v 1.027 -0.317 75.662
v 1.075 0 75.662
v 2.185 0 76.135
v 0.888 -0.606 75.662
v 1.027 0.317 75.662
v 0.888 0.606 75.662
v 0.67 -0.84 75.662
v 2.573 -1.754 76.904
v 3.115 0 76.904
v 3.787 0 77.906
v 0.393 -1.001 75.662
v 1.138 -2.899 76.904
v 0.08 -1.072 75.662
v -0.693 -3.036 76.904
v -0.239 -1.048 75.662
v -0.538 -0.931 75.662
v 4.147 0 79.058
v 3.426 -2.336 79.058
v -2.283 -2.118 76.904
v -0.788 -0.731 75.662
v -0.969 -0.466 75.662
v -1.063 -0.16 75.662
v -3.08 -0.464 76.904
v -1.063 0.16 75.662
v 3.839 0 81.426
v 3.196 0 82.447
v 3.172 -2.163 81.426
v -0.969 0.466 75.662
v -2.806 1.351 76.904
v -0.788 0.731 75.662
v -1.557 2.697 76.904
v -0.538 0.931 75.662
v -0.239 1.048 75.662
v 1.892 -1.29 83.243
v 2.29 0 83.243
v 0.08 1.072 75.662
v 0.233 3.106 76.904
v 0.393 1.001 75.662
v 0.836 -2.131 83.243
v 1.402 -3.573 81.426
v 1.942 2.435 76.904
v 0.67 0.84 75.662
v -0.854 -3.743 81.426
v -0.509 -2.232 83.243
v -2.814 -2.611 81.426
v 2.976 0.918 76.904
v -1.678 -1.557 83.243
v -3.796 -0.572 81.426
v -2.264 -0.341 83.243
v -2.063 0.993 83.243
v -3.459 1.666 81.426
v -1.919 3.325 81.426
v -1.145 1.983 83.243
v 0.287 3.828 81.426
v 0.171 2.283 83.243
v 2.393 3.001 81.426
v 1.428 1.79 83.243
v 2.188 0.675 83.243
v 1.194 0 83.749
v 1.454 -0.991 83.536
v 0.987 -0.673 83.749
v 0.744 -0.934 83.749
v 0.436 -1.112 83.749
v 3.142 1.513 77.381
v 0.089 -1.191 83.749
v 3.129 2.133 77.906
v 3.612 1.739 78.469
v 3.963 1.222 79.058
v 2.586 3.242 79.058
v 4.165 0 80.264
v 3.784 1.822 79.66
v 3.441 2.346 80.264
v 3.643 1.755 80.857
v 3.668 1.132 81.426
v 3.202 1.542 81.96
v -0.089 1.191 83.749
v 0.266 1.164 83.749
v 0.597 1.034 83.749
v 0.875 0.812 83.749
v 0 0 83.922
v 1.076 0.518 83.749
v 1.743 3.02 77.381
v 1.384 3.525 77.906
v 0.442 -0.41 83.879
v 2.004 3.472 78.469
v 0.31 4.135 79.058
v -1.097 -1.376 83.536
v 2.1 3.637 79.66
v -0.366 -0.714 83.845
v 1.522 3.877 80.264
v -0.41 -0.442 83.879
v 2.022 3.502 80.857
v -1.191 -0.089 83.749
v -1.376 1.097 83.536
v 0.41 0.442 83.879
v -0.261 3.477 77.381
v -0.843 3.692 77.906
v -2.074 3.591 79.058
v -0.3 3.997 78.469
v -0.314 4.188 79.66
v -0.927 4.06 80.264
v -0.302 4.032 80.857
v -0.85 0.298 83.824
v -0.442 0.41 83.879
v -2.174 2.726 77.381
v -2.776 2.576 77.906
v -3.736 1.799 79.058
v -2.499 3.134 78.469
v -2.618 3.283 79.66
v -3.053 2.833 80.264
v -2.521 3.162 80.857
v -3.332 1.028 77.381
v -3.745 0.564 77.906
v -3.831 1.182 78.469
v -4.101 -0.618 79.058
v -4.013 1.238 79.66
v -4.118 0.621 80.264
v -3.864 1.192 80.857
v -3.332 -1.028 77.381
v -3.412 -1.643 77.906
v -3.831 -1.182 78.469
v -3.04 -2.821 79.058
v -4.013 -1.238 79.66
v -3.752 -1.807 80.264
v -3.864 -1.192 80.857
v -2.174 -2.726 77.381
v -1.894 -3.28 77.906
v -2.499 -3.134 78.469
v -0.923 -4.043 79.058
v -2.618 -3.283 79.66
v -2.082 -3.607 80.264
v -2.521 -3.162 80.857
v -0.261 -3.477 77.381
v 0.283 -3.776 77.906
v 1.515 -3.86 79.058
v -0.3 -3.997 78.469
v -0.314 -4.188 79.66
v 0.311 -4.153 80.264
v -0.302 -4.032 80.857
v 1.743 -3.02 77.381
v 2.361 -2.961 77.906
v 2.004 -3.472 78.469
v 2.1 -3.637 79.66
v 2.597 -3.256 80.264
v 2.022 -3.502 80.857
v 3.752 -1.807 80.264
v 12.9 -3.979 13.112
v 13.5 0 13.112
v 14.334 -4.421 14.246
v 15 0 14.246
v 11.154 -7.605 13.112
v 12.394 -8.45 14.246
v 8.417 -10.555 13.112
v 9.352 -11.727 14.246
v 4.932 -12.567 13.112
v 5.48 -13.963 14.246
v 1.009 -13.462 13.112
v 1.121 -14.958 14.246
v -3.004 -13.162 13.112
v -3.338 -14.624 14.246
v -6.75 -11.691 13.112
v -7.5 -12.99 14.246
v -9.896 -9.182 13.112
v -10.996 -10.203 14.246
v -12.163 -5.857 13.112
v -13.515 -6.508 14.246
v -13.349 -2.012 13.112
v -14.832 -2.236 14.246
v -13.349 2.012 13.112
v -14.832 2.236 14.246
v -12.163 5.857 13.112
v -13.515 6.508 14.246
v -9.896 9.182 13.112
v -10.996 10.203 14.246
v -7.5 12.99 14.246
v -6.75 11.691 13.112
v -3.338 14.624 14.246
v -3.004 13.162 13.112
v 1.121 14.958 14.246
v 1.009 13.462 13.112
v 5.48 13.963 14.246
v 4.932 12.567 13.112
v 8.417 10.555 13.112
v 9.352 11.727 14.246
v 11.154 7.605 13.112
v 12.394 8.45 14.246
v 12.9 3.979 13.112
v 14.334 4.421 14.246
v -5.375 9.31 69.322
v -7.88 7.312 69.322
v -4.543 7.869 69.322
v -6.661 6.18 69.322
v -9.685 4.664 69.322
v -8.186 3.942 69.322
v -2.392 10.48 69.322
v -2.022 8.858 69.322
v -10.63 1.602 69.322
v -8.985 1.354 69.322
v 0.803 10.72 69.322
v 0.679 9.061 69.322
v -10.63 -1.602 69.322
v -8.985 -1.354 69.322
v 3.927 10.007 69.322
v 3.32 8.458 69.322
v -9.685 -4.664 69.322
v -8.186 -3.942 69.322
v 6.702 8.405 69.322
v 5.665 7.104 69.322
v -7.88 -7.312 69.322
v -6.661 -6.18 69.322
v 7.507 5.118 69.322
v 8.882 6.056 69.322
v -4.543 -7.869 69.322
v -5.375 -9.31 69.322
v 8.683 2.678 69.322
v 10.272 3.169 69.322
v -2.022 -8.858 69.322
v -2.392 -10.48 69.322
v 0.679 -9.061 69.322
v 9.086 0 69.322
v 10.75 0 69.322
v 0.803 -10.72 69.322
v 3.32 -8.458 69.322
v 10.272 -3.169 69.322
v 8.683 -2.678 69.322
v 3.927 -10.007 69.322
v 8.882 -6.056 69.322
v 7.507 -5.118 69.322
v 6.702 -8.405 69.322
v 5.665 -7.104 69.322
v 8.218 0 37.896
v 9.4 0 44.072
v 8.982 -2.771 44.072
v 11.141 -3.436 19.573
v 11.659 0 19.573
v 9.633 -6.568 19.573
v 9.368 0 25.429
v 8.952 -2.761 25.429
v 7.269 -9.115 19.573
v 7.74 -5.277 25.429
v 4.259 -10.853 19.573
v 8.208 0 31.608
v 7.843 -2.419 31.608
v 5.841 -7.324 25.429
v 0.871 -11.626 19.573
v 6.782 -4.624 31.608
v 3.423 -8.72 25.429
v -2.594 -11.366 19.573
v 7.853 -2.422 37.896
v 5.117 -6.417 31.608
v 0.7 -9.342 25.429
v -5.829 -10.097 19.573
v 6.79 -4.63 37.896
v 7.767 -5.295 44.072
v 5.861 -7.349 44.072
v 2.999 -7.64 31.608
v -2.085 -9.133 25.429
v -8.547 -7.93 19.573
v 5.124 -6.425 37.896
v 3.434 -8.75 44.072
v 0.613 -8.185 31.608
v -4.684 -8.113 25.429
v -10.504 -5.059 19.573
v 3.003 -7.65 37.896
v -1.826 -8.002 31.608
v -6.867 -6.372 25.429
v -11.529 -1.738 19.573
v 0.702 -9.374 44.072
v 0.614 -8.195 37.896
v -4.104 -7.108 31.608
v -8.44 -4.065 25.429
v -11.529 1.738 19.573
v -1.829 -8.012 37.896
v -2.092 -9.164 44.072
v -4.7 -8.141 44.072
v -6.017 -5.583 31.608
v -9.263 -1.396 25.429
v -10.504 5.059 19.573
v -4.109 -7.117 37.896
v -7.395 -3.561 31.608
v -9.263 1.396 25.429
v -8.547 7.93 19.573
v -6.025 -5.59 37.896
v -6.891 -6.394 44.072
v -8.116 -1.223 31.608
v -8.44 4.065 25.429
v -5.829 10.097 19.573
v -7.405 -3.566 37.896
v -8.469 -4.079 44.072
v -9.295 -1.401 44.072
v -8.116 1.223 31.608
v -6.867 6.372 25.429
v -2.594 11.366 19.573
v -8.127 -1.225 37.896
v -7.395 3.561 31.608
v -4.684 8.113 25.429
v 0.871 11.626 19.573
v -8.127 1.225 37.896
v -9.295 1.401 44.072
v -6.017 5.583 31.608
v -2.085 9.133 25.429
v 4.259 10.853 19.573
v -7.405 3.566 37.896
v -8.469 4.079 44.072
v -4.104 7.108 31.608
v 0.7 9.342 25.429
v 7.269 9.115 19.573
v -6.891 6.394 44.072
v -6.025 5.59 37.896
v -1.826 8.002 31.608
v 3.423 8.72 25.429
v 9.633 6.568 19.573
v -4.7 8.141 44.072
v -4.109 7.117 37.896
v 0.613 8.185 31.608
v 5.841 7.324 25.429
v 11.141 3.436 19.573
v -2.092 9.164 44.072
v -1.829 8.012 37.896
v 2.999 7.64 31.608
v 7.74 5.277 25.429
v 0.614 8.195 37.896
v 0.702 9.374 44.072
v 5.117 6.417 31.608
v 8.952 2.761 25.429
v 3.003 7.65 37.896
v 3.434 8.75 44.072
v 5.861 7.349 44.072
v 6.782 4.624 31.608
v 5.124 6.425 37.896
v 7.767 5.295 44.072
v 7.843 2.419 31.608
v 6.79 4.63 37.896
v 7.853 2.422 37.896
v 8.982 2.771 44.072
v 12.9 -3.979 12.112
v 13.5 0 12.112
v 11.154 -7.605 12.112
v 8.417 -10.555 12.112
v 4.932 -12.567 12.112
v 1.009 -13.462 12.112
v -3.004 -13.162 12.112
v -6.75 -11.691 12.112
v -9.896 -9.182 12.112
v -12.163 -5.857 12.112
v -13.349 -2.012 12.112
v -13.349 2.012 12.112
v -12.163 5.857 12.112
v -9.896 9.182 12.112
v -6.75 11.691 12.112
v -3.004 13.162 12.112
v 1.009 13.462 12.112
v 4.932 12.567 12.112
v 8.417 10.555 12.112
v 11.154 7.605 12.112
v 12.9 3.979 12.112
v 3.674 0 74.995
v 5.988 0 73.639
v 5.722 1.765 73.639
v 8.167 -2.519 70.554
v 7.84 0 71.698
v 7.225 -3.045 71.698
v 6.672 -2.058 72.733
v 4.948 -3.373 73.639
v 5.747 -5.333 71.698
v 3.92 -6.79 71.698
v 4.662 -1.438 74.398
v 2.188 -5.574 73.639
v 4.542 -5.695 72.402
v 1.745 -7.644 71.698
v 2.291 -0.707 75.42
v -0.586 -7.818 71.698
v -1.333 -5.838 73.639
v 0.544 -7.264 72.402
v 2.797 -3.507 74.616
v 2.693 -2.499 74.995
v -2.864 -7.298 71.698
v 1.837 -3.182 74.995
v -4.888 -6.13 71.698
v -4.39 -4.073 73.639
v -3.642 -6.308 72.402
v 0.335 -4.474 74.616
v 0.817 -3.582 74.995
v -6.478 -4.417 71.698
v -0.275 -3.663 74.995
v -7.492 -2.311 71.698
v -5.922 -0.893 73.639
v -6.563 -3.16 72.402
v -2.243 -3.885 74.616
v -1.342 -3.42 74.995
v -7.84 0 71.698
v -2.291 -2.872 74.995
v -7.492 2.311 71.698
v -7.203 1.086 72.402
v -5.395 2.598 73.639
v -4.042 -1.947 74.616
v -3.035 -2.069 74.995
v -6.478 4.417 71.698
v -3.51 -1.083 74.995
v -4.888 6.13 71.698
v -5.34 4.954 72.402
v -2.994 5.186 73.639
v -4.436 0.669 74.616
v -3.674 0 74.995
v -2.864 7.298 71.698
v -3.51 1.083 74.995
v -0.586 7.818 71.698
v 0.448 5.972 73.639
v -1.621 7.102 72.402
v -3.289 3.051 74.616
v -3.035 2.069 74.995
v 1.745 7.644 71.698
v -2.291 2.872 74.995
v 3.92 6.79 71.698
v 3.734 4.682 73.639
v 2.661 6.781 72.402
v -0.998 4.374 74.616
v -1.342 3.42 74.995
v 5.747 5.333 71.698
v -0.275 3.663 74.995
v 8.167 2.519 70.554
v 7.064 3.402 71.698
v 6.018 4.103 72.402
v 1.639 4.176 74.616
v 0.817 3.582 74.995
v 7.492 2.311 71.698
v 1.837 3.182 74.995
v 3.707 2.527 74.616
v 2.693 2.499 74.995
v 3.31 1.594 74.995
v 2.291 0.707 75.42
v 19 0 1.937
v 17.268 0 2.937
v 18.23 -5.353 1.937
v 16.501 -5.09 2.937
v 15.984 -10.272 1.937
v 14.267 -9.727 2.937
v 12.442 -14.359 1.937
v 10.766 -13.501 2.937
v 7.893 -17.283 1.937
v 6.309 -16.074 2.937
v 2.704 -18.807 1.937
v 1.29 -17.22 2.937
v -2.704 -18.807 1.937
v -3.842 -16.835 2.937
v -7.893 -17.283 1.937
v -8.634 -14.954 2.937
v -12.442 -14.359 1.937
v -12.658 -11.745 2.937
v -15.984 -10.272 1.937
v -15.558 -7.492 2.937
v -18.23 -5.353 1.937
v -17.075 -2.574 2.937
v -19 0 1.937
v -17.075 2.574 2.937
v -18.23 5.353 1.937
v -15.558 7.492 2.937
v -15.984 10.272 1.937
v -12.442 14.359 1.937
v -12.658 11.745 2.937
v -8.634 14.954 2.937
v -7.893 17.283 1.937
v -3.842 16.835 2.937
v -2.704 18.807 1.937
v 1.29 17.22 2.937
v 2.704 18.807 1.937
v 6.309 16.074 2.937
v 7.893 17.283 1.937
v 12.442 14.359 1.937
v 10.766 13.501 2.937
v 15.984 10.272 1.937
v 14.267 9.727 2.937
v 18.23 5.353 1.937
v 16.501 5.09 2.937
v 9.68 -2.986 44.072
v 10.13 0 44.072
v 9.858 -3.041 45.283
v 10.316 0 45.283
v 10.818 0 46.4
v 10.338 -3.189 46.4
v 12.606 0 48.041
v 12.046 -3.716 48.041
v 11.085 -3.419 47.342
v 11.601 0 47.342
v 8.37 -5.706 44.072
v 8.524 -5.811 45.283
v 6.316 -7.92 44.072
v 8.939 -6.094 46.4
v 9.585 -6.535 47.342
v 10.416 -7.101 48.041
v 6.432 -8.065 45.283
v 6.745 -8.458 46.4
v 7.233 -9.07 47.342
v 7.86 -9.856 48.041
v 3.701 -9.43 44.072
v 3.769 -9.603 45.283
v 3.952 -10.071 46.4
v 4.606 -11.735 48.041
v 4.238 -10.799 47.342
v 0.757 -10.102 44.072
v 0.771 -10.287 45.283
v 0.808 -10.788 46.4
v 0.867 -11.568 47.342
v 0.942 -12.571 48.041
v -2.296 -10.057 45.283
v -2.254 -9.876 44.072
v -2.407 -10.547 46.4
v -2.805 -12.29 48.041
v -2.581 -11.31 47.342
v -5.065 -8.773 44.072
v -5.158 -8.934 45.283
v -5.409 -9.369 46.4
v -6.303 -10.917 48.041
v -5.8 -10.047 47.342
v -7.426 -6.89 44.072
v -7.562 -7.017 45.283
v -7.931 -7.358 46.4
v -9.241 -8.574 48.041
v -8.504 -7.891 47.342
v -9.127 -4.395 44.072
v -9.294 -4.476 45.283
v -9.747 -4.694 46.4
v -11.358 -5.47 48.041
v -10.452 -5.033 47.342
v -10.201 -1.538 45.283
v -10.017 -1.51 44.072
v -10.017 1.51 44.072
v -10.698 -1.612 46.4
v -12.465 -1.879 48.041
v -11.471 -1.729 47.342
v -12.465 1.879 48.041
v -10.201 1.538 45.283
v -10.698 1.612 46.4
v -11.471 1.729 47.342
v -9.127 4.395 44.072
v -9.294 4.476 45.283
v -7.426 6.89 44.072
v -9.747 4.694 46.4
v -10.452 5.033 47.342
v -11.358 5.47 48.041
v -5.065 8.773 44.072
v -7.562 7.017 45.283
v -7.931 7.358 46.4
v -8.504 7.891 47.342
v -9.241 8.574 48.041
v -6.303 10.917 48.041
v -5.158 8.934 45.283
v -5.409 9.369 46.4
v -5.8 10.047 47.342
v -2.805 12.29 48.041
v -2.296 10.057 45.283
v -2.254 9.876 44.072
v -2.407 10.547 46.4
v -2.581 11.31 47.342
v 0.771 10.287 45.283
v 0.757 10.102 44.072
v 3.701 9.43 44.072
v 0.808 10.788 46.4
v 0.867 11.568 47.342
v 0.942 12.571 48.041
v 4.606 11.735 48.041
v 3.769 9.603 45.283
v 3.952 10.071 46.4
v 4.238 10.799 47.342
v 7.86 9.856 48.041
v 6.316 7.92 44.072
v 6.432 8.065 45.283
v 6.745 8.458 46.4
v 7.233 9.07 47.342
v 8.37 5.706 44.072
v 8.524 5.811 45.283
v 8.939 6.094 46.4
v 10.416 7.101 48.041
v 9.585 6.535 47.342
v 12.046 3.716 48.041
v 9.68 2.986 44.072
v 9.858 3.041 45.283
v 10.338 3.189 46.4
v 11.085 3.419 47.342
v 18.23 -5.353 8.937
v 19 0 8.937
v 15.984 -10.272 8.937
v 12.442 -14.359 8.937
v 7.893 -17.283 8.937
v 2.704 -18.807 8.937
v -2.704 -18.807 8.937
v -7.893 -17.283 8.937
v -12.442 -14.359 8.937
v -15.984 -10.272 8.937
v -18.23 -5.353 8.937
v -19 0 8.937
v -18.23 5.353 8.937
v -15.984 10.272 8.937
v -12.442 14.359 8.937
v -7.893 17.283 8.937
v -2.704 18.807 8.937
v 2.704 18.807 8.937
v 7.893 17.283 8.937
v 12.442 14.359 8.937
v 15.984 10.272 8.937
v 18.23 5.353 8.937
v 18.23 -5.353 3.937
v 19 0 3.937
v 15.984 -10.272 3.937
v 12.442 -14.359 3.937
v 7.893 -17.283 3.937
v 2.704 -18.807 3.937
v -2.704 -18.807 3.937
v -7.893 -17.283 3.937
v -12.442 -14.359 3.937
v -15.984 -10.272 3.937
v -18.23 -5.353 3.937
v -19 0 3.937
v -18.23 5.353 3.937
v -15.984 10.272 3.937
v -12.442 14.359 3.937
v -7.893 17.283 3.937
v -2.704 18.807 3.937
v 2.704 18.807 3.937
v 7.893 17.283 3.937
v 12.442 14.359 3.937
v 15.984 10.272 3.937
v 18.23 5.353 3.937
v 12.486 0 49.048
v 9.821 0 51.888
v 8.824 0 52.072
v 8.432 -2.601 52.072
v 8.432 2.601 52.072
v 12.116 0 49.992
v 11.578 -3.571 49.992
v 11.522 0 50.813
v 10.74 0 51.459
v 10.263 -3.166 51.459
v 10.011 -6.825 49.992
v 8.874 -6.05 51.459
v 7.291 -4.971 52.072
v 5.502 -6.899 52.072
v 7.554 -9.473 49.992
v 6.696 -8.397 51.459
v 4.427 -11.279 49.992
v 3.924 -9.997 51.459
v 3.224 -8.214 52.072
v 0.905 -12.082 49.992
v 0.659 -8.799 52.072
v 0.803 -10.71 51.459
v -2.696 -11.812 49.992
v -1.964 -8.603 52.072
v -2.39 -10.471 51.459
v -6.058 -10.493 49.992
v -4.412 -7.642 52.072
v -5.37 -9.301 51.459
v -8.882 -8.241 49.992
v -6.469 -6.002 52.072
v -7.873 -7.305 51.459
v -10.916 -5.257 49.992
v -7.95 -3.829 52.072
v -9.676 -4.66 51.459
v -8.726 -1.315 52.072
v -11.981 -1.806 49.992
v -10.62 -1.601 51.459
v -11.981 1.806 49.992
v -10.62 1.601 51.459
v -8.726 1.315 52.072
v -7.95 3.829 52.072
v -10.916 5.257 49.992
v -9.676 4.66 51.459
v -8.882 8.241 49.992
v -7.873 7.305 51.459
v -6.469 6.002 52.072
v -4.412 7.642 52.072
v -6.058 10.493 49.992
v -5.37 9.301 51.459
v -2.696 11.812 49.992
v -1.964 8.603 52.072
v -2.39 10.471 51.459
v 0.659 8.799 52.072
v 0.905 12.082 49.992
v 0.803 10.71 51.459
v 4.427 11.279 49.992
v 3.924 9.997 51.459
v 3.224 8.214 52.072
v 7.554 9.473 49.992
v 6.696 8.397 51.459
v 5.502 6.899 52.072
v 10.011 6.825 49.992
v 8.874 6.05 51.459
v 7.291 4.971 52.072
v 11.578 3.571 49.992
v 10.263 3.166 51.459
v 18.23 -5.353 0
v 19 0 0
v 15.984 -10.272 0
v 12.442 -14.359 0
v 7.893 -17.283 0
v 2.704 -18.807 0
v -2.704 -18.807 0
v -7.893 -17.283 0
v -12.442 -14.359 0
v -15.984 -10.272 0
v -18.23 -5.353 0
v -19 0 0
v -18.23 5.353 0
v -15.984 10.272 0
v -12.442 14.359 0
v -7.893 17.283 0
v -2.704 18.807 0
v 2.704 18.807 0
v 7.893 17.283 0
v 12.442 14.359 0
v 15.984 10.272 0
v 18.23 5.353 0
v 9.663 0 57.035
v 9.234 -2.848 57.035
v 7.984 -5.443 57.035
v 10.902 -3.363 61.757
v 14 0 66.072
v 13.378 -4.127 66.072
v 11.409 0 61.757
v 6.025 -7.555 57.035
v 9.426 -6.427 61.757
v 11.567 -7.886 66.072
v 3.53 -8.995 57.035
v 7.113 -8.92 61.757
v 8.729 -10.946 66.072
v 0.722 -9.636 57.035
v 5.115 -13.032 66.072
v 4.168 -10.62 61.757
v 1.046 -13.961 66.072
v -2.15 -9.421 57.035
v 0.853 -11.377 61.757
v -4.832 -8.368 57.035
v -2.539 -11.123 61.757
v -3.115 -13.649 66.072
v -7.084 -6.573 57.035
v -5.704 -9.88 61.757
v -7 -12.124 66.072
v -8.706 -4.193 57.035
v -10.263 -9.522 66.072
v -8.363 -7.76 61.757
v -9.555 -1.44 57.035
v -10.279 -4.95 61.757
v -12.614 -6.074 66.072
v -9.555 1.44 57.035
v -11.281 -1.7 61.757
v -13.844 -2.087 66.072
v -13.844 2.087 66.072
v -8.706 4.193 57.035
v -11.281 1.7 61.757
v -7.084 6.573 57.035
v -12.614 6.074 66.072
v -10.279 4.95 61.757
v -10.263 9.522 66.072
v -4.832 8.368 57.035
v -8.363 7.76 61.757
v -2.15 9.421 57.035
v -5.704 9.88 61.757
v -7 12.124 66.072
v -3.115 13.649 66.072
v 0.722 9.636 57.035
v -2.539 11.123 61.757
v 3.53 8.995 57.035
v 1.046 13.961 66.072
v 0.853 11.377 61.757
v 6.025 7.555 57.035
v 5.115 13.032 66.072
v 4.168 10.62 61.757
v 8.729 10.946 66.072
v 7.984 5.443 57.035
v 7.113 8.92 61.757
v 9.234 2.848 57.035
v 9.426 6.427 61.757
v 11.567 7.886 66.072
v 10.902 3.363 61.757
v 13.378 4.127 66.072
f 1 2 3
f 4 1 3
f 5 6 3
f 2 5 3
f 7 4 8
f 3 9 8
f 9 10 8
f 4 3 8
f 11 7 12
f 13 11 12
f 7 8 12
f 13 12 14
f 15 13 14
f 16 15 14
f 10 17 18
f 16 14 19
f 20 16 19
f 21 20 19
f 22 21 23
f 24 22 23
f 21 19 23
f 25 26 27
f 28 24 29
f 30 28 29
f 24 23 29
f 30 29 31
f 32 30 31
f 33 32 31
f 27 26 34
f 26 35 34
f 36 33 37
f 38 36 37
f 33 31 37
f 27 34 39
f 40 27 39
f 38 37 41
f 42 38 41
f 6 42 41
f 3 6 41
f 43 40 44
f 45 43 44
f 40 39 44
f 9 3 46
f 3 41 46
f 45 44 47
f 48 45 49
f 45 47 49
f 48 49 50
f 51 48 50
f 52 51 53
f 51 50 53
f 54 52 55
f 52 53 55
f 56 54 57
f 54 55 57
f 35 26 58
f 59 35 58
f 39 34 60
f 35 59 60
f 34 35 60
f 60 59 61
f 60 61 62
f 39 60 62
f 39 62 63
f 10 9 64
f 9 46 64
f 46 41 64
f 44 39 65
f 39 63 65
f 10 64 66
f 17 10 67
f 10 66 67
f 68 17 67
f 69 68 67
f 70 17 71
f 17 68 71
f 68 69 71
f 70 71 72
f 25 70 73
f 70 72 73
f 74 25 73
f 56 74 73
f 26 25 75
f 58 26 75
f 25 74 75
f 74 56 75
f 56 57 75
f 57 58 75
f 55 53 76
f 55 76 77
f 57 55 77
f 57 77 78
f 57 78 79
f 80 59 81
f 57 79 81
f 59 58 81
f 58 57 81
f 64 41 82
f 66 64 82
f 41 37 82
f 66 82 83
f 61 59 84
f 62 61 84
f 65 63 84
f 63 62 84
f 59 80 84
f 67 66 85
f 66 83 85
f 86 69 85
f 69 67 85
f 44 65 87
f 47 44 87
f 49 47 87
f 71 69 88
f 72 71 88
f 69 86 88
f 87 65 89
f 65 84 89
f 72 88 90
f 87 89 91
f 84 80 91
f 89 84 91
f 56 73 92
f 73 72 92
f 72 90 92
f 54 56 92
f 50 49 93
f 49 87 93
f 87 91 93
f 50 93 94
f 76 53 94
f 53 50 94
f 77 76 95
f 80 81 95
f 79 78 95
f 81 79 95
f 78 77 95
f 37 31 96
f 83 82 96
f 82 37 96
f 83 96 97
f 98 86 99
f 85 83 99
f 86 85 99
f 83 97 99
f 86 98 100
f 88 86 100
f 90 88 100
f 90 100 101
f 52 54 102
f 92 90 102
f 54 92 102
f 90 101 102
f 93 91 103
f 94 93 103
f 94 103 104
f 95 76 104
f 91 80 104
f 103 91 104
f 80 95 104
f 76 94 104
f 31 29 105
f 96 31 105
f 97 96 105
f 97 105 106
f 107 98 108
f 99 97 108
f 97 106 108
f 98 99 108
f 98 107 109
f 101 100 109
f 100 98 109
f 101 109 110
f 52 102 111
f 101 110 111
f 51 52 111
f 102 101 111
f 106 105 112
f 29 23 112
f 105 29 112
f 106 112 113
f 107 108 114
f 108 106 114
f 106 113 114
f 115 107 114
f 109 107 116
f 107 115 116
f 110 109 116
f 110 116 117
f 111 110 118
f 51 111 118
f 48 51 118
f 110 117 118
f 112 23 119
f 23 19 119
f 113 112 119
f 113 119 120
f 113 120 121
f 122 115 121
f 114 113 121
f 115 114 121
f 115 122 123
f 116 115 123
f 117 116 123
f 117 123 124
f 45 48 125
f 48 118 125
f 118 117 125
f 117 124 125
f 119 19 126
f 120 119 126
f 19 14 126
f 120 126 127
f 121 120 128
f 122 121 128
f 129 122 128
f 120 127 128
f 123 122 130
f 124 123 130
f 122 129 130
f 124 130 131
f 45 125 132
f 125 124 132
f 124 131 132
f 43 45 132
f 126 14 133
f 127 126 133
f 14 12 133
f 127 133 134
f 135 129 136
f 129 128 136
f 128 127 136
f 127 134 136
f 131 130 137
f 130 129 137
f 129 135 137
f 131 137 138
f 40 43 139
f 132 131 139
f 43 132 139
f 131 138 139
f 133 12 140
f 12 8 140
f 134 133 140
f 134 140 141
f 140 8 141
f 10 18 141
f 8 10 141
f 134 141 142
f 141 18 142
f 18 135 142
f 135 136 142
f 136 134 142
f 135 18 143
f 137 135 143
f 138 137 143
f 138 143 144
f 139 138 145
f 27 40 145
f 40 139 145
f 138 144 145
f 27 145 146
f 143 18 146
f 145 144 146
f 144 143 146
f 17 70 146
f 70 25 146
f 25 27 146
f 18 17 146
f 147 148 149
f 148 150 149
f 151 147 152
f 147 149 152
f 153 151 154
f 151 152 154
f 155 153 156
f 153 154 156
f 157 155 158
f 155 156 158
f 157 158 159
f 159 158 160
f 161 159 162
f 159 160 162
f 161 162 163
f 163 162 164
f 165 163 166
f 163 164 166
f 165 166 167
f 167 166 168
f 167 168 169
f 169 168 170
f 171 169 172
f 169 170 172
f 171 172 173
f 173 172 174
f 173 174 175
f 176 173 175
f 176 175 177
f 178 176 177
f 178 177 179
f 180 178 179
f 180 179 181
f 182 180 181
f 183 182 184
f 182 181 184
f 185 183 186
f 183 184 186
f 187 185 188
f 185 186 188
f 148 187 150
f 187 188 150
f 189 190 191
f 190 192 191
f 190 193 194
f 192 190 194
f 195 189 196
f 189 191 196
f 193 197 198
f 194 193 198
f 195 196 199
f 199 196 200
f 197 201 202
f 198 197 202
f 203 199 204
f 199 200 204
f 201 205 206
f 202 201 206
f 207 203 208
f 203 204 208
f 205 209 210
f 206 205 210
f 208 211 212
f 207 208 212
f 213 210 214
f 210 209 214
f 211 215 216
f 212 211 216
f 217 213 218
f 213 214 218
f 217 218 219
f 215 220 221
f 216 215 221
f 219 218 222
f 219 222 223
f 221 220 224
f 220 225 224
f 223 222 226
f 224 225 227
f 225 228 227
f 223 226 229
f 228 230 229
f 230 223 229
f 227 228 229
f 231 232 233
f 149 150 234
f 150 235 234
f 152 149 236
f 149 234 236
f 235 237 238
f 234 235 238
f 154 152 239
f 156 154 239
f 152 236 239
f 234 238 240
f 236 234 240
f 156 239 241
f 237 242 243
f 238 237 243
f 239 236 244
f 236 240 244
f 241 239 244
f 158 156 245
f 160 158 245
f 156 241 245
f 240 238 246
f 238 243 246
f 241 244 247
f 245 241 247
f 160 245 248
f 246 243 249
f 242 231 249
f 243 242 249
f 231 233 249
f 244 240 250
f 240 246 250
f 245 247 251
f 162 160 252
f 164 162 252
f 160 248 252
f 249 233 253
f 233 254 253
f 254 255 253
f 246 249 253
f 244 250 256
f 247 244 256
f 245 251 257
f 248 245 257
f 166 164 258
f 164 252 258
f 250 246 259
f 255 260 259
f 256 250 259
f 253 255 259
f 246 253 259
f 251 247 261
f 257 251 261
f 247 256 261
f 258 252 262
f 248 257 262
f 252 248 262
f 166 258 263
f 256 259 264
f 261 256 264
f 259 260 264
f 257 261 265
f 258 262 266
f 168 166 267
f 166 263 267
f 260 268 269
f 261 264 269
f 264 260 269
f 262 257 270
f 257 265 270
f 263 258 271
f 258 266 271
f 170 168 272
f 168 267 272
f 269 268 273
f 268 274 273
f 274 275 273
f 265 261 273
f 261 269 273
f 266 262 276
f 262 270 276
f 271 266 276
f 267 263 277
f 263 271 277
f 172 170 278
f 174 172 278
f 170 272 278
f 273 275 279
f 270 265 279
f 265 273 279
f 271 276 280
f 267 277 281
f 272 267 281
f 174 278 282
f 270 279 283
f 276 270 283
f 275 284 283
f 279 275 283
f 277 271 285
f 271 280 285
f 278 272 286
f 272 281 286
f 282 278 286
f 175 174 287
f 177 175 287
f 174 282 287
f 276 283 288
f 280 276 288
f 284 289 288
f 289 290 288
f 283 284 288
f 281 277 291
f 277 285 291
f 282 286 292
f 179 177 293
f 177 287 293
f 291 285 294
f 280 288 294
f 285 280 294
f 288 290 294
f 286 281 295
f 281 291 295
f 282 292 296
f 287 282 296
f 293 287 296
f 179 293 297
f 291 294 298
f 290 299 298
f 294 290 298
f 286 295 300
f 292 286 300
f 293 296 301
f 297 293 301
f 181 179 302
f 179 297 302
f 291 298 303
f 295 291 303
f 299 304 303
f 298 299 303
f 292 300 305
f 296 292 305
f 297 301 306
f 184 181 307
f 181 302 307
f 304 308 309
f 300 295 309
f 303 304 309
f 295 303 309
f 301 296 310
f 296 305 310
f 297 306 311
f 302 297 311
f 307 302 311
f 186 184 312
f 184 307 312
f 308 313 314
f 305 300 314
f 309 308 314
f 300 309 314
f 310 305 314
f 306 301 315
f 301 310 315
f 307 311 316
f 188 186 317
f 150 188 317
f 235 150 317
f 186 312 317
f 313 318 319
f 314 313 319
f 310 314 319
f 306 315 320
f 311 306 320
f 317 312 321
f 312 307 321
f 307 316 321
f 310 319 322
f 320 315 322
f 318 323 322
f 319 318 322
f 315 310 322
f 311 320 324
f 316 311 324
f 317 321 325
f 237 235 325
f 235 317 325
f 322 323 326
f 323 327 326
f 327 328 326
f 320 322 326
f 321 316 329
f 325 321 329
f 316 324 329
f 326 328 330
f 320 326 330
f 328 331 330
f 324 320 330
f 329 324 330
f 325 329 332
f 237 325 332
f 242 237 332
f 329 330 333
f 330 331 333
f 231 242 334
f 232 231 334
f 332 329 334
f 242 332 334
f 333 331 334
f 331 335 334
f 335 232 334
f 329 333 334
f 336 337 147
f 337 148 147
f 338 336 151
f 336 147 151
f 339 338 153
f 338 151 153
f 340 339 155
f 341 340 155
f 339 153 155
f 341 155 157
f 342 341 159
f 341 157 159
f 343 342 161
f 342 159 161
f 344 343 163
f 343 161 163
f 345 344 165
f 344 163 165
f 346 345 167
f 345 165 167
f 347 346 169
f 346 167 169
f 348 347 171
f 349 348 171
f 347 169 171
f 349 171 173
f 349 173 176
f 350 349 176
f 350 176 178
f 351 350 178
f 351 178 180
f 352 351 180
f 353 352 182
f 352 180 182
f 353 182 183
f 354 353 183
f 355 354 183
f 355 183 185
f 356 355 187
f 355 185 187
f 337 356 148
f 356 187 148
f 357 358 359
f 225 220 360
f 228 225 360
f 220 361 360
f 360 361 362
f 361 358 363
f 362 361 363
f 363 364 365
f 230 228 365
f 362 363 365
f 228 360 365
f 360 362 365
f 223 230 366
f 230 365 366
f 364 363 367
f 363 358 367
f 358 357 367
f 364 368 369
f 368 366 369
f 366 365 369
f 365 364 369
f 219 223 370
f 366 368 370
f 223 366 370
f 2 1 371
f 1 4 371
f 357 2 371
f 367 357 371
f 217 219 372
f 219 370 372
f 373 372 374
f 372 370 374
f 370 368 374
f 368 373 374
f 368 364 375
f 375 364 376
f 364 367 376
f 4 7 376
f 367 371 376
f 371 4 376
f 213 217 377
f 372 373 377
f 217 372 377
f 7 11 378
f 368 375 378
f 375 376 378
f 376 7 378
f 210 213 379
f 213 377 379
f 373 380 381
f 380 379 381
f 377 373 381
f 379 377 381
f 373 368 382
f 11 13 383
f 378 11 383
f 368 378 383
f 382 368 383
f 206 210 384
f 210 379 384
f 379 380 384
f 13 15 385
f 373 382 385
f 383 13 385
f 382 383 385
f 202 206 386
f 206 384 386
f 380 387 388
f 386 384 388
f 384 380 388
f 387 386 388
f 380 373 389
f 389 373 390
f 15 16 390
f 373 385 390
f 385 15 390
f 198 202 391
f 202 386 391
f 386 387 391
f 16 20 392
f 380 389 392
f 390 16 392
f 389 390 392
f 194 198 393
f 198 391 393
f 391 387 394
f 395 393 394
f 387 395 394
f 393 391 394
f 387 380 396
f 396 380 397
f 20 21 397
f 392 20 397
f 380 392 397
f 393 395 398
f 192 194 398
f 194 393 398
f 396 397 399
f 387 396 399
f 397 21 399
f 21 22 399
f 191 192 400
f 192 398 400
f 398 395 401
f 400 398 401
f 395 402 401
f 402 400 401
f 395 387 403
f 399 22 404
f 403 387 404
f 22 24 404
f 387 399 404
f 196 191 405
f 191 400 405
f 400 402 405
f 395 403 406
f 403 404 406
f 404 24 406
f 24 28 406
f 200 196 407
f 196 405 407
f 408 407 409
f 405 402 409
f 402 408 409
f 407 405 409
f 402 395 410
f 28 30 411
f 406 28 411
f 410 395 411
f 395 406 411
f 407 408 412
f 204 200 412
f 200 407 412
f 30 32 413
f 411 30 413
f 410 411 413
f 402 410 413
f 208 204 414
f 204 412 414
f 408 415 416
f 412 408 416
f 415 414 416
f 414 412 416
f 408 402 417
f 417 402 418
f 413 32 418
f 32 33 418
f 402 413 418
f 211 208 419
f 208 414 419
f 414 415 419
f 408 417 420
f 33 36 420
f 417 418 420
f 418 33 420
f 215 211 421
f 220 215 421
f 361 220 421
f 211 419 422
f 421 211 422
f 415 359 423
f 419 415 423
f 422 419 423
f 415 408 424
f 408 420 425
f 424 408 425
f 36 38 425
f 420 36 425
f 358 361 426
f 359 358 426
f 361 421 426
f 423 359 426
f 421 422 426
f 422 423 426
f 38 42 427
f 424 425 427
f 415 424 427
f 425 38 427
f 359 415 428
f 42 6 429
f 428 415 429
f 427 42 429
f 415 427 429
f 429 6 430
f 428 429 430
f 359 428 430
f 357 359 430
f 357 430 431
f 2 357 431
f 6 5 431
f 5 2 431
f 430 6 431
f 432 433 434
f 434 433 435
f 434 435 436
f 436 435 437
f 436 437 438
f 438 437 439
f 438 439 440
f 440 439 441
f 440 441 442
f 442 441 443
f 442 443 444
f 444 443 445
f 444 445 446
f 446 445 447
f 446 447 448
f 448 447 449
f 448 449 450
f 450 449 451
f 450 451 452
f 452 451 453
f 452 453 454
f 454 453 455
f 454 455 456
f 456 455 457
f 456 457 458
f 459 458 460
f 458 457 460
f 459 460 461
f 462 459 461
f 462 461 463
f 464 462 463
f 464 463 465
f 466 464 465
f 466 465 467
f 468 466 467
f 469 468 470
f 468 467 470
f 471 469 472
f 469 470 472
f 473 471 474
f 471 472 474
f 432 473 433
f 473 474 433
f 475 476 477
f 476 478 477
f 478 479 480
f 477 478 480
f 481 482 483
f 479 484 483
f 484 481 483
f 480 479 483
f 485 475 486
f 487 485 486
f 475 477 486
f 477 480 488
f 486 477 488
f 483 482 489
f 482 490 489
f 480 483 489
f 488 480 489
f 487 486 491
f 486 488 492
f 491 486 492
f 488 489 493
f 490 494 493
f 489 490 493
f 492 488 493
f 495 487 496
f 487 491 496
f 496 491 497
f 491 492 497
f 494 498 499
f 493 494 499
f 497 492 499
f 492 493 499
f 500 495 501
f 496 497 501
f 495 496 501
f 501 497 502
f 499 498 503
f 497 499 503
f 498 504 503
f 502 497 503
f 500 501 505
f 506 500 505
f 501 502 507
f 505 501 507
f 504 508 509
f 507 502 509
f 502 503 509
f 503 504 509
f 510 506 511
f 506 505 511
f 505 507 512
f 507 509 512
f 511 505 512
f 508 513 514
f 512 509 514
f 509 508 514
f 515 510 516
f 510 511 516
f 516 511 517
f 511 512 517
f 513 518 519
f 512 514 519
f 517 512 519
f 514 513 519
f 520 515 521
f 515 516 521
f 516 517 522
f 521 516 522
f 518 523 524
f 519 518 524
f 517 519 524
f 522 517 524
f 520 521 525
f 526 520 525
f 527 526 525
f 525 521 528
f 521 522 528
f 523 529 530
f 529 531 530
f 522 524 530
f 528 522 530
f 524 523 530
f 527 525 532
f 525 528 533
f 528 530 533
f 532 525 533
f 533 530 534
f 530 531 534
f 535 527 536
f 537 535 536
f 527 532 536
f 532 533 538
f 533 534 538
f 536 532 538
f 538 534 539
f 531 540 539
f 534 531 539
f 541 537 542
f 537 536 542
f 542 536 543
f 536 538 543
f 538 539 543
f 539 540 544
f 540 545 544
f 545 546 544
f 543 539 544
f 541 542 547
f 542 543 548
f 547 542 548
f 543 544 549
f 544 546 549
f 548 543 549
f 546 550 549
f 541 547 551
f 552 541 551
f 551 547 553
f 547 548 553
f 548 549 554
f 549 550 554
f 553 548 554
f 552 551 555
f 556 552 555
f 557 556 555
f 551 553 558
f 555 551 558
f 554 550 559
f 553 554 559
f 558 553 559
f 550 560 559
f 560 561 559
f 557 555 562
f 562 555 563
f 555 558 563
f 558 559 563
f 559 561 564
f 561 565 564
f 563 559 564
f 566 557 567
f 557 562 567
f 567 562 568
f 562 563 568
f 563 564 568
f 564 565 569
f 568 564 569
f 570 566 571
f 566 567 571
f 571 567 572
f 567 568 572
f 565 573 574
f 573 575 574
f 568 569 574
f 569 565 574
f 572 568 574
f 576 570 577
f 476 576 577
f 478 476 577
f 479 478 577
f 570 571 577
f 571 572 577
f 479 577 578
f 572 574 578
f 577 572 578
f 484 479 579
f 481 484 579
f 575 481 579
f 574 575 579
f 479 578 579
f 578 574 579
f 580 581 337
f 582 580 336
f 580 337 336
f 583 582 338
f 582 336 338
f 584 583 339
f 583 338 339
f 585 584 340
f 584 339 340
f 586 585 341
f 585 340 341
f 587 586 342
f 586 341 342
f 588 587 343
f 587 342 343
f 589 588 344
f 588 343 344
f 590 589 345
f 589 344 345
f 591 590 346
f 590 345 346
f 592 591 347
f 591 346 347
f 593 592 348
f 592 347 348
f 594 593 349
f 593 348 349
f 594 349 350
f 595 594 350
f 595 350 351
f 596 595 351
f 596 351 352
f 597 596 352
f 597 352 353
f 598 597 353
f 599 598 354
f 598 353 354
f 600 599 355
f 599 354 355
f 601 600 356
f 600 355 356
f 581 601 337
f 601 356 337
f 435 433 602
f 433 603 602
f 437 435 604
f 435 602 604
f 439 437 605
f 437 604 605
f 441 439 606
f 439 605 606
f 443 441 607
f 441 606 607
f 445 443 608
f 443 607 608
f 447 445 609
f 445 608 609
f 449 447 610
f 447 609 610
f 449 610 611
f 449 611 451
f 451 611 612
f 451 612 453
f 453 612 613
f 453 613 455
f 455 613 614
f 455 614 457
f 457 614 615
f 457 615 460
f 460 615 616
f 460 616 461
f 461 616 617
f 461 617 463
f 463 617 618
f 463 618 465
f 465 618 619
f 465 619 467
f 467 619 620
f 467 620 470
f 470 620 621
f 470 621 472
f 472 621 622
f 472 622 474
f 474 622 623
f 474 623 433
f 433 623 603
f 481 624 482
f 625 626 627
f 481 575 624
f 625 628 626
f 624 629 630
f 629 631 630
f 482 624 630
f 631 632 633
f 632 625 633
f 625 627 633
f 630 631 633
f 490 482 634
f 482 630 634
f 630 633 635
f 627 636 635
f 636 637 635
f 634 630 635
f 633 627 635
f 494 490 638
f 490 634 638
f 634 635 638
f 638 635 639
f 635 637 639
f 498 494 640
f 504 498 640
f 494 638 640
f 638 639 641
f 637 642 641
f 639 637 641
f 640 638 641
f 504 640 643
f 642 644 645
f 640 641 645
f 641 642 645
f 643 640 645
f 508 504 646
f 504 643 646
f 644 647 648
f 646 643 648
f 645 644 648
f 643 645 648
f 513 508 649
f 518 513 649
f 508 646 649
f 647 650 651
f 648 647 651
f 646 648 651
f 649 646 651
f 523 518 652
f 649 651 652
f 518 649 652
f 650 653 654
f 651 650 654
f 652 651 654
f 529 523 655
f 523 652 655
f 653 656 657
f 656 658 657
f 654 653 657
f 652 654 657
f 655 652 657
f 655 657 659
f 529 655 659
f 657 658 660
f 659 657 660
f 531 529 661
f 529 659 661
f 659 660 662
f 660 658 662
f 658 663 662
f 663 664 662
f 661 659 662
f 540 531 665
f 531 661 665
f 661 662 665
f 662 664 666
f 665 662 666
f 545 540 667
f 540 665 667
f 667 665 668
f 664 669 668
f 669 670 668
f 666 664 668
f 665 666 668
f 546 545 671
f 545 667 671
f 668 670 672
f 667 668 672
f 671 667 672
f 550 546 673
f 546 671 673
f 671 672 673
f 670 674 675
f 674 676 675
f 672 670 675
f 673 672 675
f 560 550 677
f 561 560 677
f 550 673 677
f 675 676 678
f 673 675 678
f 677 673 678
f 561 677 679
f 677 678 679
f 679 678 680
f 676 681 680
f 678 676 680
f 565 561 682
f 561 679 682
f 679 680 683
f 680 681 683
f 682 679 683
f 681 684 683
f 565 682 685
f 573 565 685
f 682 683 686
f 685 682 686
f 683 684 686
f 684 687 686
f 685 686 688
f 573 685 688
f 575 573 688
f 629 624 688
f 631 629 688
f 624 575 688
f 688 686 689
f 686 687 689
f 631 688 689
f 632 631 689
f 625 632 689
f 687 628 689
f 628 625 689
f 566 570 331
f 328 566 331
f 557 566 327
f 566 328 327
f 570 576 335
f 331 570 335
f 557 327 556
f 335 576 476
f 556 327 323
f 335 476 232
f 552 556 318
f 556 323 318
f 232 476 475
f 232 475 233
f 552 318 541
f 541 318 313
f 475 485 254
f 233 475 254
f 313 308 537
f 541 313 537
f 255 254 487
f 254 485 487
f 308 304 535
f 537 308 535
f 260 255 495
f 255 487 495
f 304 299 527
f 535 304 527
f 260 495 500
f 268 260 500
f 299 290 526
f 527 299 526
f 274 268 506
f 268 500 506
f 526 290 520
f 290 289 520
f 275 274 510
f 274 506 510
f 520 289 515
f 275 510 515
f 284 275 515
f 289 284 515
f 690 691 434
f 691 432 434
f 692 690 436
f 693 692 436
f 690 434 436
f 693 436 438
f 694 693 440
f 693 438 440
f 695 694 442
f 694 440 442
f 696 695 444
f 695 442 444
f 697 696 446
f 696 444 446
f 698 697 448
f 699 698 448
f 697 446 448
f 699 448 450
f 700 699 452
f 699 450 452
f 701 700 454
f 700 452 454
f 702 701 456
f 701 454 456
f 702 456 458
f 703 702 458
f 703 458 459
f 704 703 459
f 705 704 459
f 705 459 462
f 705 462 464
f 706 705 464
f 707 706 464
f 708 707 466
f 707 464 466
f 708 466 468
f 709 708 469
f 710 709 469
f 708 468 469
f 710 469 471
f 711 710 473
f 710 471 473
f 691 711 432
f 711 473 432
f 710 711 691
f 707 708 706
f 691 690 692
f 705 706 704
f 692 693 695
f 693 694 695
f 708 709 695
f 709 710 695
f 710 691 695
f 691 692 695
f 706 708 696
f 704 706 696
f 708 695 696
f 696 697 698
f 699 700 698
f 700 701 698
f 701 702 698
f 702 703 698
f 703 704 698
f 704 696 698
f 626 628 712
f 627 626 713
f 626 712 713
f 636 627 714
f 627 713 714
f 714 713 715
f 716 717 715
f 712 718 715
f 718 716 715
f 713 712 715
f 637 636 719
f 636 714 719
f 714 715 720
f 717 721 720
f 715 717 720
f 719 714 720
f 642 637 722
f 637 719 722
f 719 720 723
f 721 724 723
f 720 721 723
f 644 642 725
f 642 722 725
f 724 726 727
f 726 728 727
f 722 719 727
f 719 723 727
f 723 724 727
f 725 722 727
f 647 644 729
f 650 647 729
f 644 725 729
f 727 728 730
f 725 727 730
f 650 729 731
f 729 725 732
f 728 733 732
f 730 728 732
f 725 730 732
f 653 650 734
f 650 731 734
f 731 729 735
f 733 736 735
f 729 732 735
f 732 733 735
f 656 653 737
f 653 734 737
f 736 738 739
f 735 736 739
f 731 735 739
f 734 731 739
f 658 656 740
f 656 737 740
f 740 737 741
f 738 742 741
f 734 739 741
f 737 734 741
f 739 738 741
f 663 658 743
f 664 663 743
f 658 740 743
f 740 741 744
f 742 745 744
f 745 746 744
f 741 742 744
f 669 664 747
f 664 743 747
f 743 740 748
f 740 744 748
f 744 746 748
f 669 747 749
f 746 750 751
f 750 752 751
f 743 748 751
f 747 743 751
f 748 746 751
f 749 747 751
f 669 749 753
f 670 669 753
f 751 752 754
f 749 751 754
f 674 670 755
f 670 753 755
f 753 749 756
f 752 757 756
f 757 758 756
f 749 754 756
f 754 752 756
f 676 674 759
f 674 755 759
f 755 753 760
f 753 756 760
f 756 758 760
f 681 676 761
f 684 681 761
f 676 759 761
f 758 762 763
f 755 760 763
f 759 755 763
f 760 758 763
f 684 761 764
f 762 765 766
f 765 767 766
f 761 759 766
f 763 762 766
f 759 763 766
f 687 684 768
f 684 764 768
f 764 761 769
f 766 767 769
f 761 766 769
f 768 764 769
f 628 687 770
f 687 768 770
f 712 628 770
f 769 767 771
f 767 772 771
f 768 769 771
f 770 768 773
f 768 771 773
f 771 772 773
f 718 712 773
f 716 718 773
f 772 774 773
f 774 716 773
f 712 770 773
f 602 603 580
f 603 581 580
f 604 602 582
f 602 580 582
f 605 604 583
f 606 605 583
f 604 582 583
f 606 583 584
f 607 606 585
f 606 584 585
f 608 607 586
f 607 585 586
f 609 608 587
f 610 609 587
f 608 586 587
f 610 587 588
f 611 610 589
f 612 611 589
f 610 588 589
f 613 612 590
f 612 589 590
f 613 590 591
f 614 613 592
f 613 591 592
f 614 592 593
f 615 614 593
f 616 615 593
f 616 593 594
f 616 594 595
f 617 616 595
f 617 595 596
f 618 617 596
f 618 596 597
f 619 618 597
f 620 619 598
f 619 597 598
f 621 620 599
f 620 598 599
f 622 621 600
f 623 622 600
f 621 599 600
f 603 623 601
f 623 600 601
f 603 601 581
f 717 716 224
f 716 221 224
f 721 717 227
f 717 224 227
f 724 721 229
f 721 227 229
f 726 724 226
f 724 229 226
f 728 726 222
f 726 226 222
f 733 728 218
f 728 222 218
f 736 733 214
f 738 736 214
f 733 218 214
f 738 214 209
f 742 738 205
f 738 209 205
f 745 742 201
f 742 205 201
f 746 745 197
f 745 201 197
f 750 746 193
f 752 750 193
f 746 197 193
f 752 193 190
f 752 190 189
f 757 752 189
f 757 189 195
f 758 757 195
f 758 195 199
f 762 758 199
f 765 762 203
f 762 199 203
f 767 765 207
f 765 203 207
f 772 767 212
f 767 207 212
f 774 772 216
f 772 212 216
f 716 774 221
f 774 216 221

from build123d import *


# Not quite as in the source:
# - a feature names something its author has since deleted; it is built from what else it names


with BuildPart() as f1:
    # F0 (on Front) → F1 (revolve)
    with BuildSketch(Plane.XZ):
        with BuildLine():
            Line((0, 83.9221530378), (0, 52.0721530382))
            Line((0, 52.0721530382), (8.7499442067, 52.0721530382))
            Line((8.7499442067, 52.0721530382), (8.8241037769, 52.0721530382))
            ThreePointArc((8.8241037769, 52.0721530382), (10.4255958993, 59.4368383526), (13.9999442067, 66.0721530382))
            Line((13.9999442067, 66.0721530382), (10.7499442067, 69.3221530382))
            Line((10.7499442067, 69.3221530382), (9.08619756, 69.3221530382))
            ThreePointArc((9.08619756, 69.3221530382), (5.9884215444, 73.6392290372), (1.0750279815, 75.6620797781))
            ThreePointArc((1.0750279815, 75.6620797781), (4.1648192152, 80.2642011572), (0, 83.9221530378))
        make_face()
        with BuildLine():
            Line((0, 52.0721530382), (0, 48.041174956))
            Line((0, 48.041174956), (12.6061004532, 48.041174956))
            ThreePointArc((12.6061004532, 48.041174956), (11.5216028199, 50.8133495764), (8.8241037769, 52.0721530382))
            Line((8.8241037769, 52.0721530382), (8.7499442067, 52.0721530382))
            Line((8.7499442067, 52.0721530382), (0, 52.0721530382))
        make_face()
        with BuildLine():
            Line((0, 48.041174956), (0, 44.0721530382))
            Line((0, 44.0721530382), (9.4, 44.0721530382))
            Line((9.4, 44.0721530382), (10.13, 44.0721530382))
            ThreePointArc((10.13, 44.0721530382), (10.8184777766, 46.3995183881), (12.6061004532, 48.041174956))
            Line((12.6061004532, 48.041174956), (0, 48.041174956))
        make_face()
        Polygon((19, 0), (19, 1.9367265577), (17.2679491924, 2.9367265577), (19, 3.9367265577), (19, 8.9367265577), (13.5, 12.1121530382), (0, 12.1121530382), (0, 0), align=None)
        with BuildLine():
            Line((0, 44.0721530382), (0, 12.1121530382))
            Line((0, 12.1121530382), (13.5, 12.1121530382))
            Line((13.5, 12.1121530382), (13.5, 13.1121530382))
            Line((13.5, 13.1121530382), (15, 14.2461276344))
            ThreePointArc((15, 14.2461276344), (8.6430304158, 28.4912997708), (9.4, 44.0721530382))
            Line((9.4, 44.0721530382), (0, 44.0721530382))
        make_face()
    revolve(axis=Axis((0, 0, 41.9610765189), (0, 0, -1)))


solid = f1.part
